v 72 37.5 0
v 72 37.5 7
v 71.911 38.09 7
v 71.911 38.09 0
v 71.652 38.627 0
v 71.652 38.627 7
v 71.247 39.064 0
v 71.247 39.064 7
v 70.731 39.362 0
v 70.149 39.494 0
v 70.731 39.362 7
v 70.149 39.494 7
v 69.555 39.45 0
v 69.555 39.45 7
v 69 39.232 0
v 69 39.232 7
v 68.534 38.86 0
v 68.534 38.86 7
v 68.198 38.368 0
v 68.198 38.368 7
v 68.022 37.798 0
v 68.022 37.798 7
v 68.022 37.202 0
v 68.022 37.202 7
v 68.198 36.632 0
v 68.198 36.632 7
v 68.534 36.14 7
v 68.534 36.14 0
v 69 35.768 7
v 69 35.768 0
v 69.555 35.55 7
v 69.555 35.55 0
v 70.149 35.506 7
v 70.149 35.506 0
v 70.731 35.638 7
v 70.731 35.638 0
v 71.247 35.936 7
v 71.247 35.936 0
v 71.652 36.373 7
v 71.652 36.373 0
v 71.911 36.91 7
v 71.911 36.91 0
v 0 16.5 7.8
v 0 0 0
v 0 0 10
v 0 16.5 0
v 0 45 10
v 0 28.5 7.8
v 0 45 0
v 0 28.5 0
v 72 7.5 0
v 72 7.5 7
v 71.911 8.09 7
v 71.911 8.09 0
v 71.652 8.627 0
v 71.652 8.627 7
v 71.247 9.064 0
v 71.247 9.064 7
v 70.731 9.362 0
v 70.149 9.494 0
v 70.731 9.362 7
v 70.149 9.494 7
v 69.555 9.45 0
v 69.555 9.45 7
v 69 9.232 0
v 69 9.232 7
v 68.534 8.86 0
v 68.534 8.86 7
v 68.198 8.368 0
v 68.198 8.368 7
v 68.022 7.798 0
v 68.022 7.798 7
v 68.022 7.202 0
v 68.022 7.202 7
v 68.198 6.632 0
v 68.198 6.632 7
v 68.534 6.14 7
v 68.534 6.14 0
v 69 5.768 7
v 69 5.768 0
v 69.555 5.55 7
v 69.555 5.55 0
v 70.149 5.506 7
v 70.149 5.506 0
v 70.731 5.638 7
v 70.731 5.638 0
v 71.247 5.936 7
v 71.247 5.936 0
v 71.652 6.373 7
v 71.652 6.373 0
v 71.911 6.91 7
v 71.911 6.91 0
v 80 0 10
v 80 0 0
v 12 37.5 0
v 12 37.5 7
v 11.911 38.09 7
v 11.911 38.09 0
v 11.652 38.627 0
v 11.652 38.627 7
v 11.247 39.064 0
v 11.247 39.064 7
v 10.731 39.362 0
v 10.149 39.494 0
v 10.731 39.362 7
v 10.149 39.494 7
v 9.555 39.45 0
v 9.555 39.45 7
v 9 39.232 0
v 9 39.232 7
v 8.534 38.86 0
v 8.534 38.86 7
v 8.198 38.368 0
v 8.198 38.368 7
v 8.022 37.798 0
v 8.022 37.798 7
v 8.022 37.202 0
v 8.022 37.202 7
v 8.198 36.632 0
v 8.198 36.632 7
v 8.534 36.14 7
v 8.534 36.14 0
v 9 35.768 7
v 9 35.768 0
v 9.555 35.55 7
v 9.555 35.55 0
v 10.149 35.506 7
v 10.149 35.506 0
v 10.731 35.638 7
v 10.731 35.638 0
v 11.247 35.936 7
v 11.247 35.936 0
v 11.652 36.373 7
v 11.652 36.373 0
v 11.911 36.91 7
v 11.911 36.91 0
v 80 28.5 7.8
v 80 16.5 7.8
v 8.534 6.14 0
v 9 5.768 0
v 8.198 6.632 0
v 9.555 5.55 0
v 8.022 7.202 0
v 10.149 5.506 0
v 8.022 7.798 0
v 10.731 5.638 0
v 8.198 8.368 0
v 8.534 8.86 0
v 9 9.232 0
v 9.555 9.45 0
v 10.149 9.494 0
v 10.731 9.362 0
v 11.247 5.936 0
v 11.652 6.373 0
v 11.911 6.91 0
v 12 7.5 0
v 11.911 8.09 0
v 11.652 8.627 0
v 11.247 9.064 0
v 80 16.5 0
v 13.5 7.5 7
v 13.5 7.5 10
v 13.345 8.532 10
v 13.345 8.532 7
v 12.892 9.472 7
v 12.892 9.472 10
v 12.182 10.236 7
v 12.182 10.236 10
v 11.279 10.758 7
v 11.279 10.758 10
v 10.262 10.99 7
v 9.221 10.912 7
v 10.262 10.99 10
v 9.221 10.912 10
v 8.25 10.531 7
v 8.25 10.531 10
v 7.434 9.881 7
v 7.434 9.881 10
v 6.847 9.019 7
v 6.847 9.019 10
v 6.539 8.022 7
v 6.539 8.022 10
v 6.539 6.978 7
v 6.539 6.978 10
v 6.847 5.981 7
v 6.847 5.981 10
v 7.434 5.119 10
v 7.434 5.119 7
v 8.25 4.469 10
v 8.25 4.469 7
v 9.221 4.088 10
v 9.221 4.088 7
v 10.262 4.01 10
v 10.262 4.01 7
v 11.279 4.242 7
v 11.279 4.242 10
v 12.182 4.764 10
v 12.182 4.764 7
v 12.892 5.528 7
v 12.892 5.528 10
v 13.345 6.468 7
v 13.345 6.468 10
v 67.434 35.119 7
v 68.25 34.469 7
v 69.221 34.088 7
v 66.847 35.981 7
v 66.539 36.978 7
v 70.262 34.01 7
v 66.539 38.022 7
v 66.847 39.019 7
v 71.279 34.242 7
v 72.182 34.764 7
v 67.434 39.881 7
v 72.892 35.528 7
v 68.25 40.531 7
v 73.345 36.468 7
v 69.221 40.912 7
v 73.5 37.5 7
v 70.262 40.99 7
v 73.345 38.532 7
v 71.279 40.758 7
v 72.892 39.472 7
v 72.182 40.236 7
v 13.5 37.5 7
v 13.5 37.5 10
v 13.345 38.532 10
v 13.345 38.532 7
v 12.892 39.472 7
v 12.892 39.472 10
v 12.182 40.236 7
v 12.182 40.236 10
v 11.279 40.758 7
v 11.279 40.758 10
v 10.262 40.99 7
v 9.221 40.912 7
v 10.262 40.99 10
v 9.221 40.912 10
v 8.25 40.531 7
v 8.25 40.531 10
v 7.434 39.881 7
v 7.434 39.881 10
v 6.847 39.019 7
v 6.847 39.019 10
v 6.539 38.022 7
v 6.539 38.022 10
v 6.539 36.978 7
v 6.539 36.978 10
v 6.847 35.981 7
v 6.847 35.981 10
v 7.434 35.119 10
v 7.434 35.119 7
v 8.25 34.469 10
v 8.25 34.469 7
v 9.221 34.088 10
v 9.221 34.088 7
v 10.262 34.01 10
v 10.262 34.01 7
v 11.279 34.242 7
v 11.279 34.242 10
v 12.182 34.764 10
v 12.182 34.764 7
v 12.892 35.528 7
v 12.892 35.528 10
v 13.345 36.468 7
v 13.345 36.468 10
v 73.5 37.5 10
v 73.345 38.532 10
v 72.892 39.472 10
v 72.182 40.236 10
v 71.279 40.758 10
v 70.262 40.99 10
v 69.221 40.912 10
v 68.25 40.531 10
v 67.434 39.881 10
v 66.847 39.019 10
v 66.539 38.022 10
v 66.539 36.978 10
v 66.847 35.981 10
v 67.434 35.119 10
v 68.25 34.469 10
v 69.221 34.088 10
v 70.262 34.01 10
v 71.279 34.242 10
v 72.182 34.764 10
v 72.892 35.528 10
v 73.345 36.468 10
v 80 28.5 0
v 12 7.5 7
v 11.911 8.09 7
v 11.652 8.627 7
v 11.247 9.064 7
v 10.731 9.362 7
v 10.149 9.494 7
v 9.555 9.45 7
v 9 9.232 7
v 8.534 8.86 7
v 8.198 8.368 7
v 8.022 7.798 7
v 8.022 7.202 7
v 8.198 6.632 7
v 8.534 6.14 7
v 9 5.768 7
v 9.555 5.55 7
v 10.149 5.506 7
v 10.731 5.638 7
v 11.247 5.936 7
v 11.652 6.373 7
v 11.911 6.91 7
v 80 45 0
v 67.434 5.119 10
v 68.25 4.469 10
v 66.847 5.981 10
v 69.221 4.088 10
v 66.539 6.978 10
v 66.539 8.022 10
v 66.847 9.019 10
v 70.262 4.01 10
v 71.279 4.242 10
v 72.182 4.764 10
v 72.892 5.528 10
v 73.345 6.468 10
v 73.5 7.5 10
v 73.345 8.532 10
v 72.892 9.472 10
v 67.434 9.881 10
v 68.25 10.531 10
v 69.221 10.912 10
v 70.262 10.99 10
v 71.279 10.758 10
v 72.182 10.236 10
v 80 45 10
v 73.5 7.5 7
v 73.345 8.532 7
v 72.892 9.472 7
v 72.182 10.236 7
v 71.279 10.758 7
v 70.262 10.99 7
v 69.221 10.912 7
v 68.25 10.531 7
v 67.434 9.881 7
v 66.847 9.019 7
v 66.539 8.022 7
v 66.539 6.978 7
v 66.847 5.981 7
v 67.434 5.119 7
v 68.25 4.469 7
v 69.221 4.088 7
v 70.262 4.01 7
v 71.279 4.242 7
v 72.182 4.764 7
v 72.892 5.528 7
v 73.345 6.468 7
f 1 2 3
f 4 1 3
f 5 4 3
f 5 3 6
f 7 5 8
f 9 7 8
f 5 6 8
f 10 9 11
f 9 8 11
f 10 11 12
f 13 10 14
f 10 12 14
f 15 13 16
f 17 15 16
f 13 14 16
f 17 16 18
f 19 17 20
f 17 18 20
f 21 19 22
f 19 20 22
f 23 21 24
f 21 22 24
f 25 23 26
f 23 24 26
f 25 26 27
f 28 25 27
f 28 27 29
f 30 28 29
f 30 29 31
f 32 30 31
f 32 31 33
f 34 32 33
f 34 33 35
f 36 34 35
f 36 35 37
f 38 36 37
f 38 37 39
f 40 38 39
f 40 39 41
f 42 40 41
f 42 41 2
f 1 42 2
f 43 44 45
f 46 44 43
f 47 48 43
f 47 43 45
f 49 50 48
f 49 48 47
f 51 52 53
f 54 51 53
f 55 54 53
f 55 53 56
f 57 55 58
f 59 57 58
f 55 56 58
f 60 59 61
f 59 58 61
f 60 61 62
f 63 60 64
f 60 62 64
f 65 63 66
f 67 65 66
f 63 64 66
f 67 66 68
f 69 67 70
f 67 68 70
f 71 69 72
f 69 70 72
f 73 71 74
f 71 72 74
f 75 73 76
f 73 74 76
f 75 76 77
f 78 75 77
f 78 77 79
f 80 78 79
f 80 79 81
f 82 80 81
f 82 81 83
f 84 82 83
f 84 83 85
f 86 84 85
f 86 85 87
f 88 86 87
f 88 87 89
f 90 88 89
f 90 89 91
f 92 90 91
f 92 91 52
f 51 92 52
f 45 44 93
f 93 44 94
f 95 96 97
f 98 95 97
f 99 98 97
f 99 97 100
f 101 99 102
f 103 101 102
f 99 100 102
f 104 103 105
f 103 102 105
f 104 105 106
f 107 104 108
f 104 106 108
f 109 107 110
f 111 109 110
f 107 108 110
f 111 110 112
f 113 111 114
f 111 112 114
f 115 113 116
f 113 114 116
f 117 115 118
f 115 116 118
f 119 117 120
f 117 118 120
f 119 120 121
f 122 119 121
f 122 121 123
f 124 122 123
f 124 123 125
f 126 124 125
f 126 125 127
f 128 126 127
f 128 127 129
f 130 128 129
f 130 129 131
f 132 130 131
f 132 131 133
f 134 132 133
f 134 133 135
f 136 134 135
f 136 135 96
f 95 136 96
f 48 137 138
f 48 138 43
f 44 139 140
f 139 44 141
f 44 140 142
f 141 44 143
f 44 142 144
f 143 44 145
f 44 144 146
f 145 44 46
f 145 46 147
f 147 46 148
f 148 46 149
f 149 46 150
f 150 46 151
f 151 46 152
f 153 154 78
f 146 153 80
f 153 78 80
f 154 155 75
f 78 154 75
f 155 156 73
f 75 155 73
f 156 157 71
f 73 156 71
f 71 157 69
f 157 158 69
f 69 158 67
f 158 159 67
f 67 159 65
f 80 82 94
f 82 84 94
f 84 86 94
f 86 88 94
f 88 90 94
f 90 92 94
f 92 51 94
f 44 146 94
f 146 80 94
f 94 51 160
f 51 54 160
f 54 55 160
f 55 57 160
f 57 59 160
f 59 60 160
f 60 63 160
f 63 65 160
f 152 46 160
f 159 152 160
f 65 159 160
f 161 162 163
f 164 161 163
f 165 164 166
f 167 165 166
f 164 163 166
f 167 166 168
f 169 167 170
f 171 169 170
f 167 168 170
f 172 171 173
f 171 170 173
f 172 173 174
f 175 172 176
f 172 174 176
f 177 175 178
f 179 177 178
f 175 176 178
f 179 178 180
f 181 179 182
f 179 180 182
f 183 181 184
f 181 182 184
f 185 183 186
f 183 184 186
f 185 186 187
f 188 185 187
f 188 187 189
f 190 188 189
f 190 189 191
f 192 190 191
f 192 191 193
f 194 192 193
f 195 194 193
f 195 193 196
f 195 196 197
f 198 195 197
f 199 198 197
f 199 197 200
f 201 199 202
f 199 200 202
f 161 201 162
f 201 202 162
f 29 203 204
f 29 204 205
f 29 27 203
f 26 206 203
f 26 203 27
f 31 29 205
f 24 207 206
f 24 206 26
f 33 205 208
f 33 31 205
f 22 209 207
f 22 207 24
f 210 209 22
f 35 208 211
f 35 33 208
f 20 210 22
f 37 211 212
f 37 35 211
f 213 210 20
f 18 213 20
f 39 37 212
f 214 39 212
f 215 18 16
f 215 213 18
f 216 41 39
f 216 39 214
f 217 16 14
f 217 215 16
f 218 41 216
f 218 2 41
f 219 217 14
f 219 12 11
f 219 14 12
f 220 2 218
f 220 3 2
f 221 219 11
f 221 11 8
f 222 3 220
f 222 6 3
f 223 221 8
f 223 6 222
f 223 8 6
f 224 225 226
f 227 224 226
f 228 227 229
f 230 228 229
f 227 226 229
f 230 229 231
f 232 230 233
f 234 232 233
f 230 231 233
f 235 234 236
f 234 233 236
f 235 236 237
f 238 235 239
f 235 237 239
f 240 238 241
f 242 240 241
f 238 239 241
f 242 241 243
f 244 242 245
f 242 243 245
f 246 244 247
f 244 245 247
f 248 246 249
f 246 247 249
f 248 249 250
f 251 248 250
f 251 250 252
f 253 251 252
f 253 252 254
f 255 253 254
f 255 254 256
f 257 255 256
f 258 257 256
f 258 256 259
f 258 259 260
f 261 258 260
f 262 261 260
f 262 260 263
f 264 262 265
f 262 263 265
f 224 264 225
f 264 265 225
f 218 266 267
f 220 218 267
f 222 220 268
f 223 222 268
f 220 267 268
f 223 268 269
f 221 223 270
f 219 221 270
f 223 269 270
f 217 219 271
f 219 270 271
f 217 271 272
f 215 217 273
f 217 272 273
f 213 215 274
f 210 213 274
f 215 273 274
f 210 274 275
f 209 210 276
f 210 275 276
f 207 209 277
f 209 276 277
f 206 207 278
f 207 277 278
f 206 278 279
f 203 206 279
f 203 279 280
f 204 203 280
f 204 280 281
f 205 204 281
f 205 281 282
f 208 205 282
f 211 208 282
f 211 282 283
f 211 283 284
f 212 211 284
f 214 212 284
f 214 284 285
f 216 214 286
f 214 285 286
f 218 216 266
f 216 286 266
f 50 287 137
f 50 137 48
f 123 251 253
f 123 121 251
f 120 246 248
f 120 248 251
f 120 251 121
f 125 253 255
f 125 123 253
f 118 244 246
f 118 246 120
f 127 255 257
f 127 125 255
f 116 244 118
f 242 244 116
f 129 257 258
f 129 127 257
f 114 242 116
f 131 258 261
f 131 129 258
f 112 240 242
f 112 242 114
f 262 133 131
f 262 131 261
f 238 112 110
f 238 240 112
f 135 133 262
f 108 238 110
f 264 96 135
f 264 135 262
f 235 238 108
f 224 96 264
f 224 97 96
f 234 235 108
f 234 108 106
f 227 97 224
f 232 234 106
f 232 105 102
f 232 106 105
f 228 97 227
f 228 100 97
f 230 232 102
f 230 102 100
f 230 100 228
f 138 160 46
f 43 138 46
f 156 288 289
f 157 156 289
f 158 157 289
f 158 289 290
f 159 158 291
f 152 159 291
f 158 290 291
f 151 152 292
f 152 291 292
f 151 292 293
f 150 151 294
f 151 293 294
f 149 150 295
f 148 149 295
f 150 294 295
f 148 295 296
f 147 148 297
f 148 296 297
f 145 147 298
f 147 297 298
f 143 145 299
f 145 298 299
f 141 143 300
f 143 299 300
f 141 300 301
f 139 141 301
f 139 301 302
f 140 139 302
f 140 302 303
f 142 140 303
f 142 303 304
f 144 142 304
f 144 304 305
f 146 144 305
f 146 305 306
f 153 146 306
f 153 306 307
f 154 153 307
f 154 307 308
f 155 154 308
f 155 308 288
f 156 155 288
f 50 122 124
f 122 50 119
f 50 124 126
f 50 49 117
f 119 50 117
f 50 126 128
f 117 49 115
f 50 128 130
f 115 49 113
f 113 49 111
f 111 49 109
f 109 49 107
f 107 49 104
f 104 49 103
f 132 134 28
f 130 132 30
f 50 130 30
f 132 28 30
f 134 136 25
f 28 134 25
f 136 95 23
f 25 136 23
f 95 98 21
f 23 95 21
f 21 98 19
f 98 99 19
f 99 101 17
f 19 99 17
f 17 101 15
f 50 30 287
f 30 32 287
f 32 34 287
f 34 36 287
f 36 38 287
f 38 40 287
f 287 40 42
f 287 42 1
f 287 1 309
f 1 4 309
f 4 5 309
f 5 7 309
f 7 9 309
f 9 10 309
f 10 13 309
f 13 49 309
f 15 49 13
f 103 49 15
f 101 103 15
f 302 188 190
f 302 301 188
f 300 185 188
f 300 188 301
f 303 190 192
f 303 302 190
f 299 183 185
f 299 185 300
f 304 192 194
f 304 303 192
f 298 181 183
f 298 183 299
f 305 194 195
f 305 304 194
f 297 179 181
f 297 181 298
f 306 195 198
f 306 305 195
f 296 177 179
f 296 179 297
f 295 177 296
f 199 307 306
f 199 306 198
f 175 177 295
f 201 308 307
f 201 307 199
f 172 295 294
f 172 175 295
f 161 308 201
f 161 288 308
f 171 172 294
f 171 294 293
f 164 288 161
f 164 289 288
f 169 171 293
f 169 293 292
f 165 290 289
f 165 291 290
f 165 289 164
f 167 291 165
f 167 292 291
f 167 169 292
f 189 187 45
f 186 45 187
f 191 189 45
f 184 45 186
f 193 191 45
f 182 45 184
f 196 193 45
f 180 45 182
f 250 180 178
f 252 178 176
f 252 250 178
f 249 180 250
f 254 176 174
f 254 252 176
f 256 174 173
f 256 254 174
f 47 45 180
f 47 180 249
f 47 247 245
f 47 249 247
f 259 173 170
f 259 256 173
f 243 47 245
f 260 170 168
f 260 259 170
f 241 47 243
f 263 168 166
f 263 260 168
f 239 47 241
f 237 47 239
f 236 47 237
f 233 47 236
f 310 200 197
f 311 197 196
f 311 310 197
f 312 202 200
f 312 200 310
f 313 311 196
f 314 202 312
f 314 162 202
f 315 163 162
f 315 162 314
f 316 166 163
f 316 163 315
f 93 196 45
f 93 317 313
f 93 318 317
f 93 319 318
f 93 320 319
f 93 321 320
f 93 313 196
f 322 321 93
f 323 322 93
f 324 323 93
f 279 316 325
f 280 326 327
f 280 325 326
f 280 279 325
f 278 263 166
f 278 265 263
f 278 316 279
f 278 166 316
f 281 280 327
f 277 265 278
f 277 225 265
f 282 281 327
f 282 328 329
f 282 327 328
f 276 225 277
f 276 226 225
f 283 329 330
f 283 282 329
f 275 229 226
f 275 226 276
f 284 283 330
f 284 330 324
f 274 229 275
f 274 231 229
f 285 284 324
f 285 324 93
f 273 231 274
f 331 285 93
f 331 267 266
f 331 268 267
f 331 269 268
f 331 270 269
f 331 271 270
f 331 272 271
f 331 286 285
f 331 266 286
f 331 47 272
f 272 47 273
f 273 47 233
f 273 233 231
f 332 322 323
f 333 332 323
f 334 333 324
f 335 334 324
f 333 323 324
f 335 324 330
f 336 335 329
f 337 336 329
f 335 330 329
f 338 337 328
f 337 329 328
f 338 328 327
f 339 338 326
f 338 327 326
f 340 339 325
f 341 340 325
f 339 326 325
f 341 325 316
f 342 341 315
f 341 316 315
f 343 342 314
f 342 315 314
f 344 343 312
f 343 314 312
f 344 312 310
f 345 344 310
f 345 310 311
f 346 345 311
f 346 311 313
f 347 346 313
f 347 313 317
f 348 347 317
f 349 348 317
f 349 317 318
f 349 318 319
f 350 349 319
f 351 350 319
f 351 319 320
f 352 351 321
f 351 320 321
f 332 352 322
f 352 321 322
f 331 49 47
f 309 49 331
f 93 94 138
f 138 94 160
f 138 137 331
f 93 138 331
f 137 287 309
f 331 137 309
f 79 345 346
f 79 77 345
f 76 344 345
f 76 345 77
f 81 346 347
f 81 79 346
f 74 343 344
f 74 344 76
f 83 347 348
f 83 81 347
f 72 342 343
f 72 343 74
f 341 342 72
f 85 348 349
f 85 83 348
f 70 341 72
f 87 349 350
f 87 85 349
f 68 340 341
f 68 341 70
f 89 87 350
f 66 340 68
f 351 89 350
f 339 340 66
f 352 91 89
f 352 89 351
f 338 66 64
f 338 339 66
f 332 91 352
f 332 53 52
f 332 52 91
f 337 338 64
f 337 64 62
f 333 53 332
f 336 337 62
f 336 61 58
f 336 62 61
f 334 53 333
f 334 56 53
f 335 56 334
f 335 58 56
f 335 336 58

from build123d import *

# Parameters (mm, degrees)
SKETCH1_W           = 80
SKETCH1_H           = 45
BOSS_EXTRUDE1_DEPTH = 10
SKETCH2_W           = 110
SKETCH2_H           = 12
CUT_EXTRUDE1_DEPTH  = 7.8
SKETCH4_R           = 2
CUT_EXTRUDE3_DEPTH  = 11
SKETCH5_R           = 3.5
CUT_EXTRUDE4_DEPTH  = 3


with BuildPart() as part:
    # Sketch1 → Boss-Extrude1 (new body)
    with BuildSketch(Plane.XY):
        with Locations((40, 22.5)):
            Rectangle(SKETCH1_W, SKETCH1_H)
    extrude(amount=BOSS_EXTRUDE1_DEPTH)

    # Sketch2 → Cut-Extrude1 (cut)
    with BuildSketch(Plane(origin=(0, 0, 0), x_dir=(-1, 0, 0), z_dir=(0, 0, -1))):
        with Locations((-25, 22.5)):
            Rectangle(SKETCH2_W, SKETCH2_H)
    extrude(amount=-CUT_EXTRUDE1_DEPTH, mode=Mode.SUBTRACT)

    # Sketch4 → Cut-Extrude3 (cut, through all)
    with BuildSketch(Plane.XY.offset(10)):
        with Locations((10, 37.5)):
            Circle(SKETCH4_R)
        with Locations((70, 37.5)):
            Circle(SKETCH4_R)
        with Locations((70, 7.5)):
            Circle(SKETCH4_R)
        with Locations((10, 7.5)):
            Circle(SKETCH4_R)
    extrude(amount=-CUT_EXTRUDE3_DEPTH, mode=Mode.SUBTRACT)

    # Sketch5 → Cut-Extrude4 (cut)
    with BuildSketch(Plane.XY.offset(10)):
        with Locations((10, 37.5)):
            Circle(SKETCH5_R)
        with Locations((70, 37.5)):
            Circle(SKETCH5_R)
        with Locations((70, 7.5)):
            Circle(SKETCH5_R)
        with Locations((10, 7.5)):
            Circle(SKETCH5_R)
    extrude(amount=-CUT_EXTRUDE4_DEPTH, mode=Mode.SUBTRACT)


solid = part.part
